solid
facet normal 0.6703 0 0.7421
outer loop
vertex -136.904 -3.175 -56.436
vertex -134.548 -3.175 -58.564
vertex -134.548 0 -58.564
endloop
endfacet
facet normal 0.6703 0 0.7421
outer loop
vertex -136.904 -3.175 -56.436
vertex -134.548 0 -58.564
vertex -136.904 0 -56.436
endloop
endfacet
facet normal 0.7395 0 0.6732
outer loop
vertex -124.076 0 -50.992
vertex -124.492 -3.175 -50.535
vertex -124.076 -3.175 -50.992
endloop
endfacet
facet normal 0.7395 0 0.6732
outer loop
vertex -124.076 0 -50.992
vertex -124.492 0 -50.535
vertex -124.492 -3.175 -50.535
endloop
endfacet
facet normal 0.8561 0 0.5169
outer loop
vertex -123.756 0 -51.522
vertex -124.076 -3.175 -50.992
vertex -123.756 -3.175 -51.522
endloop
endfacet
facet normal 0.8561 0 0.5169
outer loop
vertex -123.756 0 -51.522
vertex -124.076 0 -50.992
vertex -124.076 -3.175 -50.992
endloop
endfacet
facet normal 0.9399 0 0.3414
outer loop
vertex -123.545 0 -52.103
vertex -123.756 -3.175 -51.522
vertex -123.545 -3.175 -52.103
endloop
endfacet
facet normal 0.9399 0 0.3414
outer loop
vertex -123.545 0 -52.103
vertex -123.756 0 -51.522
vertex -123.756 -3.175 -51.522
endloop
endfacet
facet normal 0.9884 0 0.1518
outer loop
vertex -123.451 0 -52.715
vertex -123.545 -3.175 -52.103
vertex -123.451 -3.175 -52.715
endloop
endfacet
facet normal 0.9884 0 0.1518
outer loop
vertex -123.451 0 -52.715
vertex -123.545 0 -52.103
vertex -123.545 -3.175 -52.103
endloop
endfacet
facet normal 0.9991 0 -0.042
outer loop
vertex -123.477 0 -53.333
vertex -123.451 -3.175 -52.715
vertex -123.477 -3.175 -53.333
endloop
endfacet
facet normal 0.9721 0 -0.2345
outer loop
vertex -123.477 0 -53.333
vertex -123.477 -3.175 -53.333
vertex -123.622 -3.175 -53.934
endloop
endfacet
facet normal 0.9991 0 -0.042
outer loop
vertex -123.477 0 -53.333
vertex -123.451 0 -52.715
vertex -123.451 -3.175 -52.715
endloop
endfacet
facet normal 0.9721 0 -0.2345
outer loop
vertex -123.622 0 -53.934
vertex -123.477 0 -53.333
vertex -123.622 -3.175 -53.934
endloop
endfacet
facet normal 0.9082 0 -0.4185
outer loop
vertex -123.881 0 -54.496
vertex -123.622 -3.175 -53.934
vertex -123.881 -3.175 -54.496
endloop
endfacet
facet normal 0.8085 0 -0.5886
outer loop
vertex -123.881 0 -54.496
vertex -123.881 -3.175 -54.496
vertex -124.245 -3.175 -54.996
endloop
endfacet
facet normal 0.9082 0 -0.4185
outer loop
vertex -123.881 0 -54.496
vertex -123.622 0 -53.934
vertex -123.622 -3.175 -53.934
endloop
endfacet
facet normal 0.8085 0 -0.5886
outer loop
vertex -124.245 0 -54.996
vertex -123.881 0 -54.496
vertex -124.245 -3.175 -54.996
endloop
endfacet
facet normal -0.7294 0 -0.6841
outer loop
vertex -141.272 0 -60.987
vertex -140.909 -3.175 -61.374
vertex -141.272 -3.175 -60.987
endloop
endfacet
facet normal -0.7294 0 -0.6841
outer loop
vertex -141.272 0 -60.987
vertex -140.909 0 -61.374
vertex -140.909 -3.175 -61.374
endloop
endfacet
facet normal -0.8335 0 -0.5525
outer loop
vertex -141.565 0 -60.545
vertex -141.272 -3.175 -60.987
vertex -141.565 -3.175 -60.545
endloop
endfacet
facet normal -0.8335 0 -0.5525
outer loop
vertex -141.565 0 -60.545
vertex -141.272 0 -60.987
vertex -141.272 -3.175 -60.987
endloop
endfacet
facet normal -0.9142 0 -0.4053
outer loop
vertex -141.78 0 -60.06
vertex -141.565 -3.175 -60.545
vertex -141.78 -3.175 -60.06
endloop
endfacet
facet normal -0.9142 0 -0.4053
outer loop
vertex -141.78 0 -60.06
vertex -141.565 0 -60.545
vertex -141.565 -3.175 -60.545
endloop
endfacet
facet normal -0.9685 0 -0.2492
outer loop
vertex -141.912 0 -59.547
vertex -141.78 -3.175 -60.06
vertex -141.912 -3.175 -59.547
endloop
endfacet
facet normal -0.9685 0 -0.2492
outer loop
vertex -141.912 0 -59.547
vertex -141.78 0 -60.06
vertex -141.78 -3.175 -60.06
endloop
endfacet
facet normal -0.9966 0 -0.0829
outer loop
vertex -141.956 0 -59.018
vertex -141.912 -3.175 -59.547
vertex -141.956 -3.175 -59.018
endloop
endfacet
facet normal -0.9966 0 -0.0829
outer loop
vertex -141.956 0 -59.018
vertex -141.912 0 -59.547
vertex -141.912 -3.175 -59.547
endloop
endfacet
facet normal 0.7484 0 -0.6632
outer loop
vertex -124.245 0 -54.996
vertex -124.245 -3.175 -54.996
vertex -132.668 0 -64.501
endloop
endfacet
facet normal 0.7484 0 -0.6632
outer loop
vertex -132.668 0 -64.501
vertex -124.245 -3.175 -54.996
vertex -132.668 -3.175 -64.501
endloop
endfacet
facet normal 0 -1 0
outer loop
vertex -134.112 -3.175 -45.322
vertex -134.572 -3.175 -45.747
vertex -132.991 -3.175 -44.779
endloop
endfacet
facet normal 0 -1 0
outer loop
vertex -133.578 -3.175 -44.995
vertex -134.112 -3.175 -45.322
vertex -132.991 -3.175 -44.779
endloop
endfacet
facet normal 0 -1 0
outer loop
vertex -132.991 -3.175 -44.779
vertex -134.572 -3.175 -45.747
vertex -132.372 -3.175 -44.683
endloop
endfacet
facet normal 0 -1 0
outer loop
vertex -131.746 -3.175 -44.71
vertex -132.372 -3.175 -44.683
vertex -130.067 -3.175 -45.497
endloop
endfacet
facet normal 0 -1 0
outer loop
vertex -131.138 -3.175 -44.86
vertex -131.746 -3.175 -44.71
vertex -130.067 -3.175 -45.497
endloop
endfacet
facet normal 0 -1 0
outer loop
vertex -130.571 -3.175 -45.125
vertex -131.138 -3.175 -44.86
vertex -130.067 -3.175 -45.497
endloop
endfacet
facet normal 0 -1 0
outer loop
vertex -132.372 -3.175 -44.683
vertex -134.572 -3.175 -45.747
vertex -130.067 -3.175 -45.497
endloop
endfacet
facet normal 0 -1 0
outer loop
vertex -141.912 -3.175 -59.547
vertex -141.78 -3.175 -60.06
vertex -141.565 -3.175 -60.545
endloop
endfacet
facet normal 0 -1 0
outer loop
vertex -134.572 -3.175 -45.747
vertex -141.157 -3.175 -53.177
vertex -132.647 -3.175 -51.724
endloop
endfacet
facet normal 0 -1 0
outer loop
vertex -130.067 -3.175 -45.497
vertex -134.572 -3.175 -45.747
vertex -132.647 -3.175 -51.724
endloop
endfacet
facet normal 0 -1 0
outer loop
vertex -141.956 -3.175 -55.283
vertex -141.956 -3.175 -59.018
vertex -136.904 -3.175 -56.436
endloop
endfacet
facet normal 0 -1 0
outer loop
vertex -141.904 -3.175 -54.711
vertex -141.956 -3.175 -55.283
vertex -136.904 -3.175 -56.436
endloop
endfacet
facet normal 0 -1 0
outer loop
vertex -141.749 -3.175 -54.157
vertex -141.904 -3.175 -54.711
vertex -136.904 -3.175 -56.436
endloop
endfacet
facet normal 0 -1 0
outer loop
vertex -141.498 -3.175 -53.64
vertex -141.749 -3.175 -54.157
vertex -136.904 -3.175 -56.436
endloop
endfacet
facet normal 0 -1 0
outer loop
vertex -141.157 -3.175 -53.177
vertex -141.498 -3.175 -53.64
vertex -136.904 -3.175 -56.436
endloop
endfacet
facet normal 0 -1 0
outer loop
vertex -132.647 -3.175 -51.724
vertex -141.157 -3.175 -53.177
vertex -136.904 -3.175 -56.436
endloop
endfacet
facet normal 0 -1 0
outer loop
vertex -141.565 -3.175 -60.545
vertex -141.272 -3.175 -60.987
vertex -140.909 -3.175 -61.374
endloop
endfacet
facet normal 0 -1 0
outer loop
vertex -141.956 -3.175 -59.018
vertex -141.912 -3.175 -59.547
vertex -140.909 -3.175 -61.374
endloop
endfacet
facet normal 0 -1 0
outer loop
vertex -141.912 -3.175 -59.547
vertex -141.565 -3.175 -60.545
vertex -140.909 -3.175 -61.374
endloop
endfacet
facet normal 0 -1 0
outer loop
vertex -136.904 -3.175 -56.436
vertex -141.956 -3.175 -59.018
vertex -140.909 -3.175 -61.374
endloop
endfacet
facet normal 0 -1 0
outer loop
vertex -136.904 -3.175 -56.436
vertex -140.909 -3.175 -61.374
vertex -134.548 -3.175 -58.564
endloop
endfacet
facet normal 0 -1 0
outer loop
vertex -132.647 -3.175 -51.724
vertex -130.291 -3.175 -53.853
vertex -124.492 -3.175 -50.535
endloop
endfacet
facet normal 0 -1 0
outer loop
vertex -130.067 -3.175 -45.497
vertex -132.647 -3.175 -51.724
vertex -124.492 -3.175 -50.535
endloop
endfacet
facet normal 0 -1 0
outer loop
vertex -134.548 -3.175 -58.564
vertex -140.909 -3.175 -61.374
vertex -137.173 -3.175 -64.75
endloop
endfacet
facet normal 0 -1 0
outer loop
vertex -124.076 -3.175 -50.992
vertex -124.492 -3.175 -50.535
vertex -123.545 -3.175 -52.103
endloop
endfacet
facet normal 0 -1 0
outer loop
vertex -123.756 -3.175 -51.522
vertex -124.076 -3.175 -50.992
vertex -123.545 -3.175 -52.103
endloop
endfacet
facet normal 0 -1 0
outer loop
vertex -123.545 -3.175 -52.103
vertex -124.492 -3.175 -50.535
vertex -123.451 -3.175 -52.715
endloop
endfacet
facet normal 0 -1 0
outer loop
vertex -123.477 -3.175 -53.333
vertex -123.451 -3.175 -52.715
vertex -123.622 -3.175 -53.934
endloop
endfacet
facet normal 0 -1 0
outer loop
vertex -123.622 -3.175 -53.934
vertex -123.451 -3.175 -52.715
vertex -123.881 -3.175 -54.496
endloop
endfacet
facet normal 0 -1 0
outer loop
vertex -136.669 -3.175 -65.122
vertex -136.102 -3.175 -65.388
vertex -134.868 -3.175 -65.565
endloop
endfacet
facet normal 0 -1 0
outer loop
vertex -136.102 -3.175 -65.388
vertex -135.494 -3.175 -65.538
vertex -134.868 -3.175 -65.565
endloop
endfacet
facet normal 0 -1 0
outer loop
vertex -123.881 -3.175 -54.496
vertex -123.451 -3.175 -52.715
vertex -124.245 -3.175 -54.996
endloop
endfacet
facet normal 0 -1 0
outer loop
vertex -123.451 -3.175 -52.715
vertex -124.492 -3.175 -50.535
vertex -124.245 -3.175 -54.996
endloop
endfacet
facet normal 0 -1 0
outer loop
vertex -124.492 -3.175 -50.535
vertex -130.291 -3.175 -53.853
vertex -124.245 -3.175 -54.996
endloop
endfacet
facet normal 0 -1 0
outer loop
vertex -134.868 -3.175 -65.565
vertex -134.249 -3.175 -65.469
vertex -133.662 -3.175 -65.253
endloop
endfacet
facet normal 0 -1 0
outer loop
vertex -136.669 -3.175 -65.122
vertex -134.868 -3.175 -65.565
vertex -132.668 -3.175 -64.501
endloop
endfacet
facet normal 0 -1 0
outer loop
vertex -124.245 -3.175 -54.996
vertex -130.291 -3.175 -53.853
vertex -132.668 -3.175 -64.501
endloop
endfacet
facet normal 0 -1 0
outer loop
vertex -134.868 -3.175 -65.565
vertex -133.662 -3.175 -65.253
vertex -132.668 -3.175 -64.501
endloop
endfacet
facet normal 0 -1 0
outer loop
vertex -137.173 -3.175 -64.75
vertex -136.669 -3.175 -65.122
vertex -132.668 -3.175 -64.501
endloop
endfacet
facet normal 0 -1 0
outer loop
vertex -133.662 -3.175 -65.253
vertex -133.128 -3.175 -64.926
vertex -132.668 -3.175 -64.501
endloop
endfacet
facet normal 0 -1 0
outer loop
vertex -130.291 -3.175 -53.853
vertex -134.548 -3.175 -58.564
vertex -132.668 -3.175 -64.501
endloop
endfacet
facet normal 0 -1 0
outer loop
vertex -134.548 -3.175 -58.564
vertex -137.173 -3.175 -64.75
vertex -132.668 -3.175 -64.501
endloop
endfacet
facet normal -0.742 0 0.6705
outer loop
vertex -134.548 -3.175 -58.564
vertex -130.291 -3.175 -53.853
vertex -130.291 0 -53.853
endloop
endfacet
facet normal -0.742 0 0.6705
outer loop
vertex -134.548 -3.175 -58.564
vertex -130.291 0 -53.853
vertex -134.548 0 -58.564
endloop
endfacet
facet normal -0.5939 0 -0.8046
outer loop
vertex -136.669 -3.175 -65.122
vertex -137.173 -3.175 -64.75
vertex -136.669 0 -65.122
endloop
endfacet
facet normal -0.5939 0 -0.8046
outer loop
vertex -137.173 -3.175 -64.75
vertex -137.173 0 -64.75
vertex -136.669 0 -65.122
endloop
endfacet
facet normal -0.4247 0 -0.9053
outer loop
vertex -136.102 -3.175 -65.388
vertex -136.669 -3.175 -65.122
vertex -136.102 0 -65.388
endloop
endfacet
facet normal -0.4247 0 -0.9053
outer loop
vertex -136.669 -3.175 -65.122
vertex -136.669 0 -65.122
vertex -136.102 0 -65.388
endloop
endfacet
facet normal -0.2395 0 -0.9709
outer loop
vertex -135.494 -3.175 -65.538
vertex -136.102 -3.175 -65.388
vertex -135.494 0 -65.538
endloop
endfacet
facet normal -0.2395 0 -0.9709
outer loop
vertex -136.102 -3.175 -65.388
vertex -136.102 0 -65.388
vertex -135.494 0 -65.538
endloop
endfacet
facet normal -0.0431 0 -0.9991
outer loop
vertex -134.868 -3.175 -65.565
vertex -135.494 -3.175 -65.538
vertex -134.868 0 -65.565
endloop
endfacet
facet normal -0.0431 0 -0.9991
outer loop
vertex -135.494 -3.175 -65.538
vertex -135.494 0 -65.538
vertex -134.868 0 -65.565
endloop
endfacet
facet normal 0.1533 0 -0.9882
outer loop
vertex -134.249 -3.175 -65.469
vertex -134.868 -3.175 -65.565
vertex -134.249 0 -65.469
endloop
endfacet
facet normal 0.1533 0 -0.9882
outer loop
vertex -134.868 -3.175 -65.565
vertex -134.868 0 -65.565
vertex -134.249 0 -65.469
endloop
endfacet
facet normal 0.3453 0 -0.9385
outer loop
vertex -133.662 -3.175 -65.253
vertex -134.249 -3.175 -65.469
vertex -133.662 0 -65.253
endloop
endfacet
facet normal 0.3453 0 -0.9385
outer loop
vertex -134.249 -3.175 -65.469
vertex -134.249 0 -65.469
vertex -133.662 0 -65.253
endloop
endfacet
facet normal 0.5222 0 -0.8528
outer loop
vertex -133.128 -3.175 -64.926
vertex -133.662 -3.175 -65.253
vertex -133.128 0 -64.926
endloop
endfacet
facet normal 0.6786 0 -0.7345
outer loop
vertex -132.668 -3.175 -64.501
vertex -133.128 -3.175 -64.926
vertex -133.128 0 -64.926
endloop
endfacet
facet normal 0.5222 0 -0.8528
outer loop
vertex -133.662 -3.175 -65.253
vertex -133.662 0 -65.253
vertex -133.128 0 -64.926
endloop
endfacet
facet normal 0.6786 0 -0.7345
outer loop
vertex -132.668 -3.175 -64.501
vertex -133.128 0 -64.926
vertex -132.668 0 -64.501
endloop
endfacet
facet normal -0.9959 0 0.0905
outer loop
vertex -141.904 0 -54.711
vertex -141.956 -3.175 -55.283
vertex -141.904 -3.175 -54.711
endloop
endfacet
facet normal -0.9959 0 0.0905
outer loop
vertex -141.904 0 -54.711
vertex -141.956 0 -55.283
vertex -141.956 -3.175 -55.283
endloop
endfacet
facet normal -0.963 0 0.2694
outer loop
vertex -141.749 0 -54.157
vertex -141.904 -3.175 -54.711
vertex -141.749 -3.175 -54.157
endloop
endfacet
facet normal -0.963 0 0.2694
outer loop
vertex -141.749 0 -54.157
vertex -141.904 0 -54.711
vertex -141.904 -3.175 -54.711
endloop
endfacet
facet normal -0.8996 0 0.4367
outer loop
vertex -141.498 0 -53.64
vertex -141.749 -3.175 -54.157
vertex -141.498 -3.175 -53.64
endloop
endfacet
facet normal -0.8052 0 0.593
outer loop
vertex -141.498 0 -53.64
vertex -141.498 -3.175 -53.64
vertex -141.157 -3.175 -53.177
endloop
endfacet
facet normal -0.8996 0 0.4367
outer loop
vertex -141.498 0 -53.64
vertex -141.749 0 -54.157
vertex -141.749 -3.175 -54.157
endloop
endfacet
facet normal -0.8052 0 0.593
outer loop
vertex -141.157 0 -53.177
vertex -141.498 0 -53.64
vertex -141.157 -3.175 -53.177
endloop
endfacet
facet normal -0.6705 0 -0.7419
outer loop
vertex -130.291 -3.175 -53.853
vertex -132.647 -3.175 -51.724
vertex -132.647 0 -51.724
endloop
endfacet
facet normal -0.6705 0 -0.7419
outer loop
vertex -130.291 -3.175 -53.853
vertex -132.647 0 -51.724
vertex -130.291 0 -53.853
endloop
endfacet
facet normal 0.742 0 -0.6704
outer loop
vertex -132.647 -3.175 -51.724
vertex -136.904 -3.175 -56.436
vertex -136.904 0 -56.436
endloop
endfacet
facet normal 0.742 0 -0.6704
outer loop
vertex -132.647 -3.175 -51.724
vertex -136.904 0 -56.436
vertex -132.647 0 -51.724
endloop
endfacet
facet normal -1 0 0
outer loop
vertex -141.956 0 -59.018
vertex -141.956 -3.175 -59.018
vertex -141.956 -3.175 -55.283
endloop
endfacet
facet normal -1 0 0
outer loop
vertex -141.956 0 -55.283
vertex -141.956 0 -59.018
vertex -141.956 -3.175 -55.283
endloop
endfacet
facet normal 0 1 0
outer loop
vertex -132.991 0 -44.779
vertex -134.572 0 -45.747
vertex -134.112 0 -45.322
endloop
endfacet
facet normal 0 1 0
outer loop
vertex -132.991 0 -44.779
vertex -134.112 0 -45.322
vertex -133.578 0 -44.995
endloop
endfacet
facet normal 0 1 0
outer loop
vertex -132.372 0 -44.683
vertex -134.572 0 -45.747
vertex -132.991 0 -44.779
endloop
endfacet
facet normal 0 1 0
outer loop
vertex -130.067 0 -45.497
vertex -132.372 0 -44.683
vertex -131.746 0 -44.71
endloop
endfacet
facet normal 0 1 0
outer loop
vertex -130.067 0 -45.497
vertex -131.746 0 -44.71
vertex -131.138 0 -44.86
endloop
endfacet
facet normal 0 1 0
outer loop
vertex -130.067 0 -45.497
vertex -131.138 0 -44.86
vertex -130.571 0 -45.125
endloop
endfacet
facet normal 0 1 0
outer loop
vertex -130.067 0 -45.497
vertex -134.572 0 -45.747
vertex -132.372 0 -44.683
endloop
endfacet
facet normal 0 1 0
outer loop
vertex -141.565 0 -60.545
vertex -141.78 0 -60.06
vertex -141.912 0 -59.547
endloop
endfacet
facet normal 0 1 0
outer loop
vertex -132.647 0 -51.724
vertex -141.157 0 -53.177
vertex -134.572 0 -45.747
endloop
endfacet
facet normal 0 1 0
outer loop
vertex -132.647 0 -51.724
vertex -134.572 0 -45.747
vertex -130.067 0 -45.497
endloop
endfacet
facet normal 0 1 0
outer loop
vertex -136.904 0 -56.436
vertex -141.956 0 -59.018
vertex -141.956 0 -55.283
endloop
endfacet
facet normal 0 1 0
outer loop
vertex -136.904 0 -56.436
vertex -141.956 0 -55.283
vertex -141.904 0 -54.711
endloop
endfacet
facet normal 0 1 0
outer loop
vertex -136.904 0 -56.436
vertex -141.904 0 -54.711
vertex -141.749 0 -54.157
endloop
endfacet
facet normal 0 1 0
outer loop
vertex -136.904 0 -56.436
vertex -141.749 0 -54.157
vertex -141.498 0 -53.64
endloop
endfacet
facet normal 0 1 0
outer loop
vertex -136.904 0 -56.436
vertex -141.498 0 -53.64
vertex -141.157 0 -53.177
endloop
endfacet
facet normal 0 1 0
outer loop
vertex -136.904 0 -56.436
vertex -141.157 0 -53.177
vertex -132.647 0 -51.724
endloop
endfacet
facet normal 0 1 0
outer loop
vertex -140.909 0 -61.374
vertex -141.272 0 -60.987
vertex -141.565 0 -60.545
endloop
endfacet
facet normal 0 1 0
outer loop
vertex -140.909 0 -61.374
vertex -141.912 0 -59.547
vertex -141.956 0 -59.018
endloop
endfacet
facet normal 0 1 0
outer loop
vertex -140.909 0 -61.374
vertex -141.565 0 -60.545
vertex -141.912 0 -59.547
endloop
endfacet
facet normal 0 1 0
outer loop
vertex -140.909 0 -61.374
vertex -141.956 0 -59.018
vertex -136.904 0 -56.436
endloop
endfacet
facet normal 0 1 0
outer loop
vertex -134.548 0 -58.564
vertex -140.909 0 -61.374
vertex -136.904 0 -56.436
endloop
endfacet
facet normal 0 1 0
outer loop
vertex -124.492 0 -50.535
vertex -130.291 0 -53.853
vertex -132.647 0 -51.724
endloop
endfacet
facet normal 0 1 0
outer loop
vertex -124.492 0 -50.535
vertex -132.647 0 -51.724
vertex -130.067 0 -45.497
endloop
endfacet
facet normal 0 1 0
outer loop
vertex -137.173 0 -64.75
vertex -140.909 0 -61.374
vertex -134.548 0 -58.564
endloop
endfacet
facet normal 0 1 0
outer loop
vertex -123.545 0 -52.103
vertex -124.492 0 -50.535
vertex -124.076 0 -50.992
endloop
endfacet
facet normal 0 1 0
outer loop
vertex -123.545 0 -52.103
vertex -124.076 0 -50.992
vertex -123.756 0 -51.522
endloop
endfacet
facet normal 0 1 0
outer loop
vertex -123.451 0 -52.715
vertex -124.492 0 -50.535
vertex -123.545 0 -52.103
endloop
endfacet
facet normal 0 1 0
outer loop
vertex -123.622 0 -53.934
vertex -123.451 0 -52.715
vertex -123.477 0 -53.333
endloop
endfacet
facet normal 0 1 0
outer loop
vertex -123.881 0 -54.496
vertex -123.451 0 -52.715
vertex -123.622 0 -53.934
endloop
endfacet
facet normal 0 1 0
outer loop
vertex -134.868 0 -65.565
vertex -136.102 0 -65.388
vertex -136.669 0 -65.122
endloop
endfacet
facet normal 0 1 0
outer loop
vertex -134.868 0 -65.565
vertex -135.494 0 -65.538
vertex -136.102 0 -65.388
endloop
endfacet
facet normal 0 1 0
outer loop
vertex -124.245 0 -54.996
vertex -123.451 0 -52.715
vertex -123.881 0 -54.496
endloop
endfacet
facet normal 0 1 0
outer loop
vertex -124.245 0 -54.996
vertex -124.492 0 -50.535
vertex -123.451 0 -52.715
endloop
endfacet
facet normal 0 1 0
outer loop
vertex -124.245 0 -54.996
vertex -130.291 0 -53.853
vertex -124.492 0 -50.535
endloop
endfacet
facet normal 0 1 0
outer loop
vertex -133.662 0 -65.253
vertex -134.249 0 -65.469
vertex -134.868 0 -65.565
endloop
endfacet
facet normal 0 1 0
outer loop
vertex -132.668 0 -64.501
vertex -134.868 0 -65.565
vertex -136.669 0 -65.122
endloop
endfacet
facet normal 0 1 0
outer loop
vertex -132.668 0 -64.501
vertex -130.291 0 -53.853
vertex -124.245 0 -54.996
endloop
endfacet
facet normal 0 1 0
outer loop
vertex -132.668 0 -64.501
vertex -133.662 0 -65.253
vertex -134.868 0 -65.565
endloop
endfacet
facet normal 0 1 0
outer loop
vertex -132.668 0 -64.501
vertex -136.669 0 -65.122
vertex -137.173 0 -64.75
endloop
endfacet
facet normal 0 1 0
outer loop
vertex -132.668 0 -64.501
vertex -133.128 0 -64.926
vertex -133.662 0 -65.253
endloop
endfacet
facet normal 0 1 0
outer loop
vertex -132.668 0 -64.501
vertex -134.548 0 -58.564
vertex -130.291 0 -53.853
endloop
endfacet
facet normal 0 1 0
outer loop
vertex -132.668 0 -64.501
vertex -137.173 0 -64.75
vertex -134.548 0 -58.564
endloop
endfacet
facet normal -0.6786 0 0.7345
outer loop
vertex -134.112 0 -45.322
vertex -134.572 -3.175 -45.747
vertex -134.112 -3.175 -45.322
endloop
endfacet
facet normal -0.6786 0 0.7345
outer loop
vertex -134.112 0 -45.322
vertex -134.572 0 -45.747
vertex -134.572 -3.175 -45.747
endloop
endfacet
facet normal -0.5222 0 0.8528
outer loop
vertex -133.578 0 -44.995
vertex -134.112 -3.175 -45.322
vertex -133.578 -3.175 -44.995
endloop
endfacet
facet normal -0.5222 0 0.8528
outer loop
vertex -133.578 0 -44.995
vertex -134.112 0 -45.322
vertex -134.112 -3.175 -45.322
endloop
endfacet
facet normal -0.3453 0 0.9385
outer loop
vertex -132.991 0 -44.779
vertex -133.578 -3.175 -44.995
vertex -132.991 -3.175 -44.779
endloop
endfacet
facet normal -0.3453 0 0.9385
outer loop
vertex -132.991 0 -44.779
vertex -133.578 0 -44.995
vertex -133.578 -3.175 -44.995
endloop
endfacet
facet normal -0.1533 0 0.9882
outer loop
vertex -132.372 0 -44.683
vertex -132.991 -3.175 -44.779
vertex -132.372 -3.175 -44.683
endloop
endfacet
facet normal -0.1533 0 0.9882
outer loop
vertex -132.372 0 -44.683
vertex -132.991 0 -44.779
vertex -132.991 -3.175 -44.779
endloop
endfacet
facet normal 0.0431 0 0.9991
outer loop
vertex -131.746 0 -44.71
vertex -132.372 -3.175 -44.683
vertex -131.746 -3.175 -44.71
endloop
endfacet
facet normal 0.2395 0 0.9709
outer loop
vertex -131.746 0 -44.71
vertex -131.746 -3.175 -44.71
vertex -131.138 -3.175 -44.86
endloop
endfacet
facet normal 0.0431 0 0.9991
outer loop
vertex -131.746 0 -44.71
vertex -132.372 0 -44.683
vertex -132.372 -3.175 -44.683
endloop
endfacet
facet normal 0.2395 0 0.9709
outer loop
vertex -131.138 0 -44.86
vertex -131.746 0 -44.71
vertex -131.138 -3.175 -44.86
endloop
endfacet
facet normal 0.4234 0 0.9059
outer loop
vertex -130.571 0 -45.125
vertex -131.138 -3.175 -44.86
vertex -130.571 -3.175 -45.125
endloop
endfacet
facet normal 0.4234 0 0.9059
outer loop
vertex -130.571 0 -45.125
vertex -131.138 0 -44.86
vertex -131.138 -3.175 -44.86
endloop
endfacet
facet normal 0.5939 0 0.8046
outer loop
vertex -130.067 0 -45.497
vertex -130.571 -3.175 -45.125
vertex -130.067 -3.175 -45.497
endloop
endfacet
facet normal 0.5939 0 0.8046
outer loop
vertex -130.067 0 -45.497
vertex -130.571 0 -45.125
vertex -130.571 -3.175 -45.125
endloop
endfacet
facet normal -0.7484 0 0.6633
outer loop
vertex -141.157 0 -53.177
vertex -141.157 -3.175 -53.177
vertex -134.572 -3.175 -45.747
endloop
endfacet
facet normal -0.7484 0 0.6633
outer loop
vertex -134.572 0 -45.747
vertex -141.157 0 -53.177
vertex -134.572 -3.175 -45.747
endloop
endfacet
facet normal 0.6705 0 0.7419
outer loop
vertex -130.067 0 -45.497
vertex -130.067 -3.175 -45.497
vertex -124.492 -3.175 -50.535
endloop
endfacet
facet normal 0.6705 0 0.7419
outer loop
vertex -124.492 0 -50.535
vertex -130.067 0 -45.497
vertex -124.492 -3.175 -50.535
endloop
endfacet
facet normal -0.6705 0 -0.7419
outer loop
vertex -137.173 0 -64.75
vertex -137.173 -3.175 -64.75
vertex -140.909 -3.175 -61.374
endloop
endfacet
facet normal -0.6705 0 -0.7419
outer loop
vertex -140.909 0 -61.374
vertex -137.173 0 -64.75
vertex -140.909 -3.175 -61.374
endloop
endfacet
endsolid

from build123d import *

# Parameters (mm, degrees)
STOCK_RECORD_START          = -3.175
STOCK_RECORD_NEEDLE_1_DEPTH = 3.175
FILLET1_R                   = 3.175
NEEDLE_HOLE_DEPTH           = 157.399949281


# Read off the part's stored shape, not the designer's step: Stock-Record Needle-1
with BuildPart() as part:
    # Stock-Record Needle-1 outline → Stock-Record Needle-1 (new body)
    with BuildSketch(Plane(origin=(0, 0, 0), x_dir=(1, 0, 0), z_dir=(0, 1, 0)).offset(STOCK_RECORD_START)):
        Polygon((-134.794168142, 66.899467737), (-141.955930631, 60.428744281), (-141.955930631, 54.078744281), (-132.445850386, 43.348439368), (-122.158808708, 52.642883574), align=None)
    extrude(amount=STOCK_RECORD_NEEDLE_1_DEPTH)

    # Fillet1
    fillet1_edges = [part.edges().sort_by_distance(p)[0] for p in [
        (-132.445850386, -1.5875, -43.348439368),
        (-122.158808708, -1.5875, -52.642883574),
        (-134.794168142, -1.5875, -66.899467737),
        (-141.955930631, -1.5875, -60.428744281),
        (-141.955930631, -1.5875, -54.078744281),
    ]]
    fillet(fillet1_edges, radius=FILLET1_R)

    # Needle Hole Sketch → Needle Hole (cut, through all)
    with BuildSketch(Plane.XZ.offset(3.175)):
        Polygon((-136.903920332, -56.435895918), (-132.646865427, -51.72421007), (-130.291022503, -53.852737522), (-134.548077408, -58.564423371), align=None)
    extrude(amount=-NEEDLE_HOLE_DEPTH, mode=Mode.SUBTRACT)


solid = part.part
